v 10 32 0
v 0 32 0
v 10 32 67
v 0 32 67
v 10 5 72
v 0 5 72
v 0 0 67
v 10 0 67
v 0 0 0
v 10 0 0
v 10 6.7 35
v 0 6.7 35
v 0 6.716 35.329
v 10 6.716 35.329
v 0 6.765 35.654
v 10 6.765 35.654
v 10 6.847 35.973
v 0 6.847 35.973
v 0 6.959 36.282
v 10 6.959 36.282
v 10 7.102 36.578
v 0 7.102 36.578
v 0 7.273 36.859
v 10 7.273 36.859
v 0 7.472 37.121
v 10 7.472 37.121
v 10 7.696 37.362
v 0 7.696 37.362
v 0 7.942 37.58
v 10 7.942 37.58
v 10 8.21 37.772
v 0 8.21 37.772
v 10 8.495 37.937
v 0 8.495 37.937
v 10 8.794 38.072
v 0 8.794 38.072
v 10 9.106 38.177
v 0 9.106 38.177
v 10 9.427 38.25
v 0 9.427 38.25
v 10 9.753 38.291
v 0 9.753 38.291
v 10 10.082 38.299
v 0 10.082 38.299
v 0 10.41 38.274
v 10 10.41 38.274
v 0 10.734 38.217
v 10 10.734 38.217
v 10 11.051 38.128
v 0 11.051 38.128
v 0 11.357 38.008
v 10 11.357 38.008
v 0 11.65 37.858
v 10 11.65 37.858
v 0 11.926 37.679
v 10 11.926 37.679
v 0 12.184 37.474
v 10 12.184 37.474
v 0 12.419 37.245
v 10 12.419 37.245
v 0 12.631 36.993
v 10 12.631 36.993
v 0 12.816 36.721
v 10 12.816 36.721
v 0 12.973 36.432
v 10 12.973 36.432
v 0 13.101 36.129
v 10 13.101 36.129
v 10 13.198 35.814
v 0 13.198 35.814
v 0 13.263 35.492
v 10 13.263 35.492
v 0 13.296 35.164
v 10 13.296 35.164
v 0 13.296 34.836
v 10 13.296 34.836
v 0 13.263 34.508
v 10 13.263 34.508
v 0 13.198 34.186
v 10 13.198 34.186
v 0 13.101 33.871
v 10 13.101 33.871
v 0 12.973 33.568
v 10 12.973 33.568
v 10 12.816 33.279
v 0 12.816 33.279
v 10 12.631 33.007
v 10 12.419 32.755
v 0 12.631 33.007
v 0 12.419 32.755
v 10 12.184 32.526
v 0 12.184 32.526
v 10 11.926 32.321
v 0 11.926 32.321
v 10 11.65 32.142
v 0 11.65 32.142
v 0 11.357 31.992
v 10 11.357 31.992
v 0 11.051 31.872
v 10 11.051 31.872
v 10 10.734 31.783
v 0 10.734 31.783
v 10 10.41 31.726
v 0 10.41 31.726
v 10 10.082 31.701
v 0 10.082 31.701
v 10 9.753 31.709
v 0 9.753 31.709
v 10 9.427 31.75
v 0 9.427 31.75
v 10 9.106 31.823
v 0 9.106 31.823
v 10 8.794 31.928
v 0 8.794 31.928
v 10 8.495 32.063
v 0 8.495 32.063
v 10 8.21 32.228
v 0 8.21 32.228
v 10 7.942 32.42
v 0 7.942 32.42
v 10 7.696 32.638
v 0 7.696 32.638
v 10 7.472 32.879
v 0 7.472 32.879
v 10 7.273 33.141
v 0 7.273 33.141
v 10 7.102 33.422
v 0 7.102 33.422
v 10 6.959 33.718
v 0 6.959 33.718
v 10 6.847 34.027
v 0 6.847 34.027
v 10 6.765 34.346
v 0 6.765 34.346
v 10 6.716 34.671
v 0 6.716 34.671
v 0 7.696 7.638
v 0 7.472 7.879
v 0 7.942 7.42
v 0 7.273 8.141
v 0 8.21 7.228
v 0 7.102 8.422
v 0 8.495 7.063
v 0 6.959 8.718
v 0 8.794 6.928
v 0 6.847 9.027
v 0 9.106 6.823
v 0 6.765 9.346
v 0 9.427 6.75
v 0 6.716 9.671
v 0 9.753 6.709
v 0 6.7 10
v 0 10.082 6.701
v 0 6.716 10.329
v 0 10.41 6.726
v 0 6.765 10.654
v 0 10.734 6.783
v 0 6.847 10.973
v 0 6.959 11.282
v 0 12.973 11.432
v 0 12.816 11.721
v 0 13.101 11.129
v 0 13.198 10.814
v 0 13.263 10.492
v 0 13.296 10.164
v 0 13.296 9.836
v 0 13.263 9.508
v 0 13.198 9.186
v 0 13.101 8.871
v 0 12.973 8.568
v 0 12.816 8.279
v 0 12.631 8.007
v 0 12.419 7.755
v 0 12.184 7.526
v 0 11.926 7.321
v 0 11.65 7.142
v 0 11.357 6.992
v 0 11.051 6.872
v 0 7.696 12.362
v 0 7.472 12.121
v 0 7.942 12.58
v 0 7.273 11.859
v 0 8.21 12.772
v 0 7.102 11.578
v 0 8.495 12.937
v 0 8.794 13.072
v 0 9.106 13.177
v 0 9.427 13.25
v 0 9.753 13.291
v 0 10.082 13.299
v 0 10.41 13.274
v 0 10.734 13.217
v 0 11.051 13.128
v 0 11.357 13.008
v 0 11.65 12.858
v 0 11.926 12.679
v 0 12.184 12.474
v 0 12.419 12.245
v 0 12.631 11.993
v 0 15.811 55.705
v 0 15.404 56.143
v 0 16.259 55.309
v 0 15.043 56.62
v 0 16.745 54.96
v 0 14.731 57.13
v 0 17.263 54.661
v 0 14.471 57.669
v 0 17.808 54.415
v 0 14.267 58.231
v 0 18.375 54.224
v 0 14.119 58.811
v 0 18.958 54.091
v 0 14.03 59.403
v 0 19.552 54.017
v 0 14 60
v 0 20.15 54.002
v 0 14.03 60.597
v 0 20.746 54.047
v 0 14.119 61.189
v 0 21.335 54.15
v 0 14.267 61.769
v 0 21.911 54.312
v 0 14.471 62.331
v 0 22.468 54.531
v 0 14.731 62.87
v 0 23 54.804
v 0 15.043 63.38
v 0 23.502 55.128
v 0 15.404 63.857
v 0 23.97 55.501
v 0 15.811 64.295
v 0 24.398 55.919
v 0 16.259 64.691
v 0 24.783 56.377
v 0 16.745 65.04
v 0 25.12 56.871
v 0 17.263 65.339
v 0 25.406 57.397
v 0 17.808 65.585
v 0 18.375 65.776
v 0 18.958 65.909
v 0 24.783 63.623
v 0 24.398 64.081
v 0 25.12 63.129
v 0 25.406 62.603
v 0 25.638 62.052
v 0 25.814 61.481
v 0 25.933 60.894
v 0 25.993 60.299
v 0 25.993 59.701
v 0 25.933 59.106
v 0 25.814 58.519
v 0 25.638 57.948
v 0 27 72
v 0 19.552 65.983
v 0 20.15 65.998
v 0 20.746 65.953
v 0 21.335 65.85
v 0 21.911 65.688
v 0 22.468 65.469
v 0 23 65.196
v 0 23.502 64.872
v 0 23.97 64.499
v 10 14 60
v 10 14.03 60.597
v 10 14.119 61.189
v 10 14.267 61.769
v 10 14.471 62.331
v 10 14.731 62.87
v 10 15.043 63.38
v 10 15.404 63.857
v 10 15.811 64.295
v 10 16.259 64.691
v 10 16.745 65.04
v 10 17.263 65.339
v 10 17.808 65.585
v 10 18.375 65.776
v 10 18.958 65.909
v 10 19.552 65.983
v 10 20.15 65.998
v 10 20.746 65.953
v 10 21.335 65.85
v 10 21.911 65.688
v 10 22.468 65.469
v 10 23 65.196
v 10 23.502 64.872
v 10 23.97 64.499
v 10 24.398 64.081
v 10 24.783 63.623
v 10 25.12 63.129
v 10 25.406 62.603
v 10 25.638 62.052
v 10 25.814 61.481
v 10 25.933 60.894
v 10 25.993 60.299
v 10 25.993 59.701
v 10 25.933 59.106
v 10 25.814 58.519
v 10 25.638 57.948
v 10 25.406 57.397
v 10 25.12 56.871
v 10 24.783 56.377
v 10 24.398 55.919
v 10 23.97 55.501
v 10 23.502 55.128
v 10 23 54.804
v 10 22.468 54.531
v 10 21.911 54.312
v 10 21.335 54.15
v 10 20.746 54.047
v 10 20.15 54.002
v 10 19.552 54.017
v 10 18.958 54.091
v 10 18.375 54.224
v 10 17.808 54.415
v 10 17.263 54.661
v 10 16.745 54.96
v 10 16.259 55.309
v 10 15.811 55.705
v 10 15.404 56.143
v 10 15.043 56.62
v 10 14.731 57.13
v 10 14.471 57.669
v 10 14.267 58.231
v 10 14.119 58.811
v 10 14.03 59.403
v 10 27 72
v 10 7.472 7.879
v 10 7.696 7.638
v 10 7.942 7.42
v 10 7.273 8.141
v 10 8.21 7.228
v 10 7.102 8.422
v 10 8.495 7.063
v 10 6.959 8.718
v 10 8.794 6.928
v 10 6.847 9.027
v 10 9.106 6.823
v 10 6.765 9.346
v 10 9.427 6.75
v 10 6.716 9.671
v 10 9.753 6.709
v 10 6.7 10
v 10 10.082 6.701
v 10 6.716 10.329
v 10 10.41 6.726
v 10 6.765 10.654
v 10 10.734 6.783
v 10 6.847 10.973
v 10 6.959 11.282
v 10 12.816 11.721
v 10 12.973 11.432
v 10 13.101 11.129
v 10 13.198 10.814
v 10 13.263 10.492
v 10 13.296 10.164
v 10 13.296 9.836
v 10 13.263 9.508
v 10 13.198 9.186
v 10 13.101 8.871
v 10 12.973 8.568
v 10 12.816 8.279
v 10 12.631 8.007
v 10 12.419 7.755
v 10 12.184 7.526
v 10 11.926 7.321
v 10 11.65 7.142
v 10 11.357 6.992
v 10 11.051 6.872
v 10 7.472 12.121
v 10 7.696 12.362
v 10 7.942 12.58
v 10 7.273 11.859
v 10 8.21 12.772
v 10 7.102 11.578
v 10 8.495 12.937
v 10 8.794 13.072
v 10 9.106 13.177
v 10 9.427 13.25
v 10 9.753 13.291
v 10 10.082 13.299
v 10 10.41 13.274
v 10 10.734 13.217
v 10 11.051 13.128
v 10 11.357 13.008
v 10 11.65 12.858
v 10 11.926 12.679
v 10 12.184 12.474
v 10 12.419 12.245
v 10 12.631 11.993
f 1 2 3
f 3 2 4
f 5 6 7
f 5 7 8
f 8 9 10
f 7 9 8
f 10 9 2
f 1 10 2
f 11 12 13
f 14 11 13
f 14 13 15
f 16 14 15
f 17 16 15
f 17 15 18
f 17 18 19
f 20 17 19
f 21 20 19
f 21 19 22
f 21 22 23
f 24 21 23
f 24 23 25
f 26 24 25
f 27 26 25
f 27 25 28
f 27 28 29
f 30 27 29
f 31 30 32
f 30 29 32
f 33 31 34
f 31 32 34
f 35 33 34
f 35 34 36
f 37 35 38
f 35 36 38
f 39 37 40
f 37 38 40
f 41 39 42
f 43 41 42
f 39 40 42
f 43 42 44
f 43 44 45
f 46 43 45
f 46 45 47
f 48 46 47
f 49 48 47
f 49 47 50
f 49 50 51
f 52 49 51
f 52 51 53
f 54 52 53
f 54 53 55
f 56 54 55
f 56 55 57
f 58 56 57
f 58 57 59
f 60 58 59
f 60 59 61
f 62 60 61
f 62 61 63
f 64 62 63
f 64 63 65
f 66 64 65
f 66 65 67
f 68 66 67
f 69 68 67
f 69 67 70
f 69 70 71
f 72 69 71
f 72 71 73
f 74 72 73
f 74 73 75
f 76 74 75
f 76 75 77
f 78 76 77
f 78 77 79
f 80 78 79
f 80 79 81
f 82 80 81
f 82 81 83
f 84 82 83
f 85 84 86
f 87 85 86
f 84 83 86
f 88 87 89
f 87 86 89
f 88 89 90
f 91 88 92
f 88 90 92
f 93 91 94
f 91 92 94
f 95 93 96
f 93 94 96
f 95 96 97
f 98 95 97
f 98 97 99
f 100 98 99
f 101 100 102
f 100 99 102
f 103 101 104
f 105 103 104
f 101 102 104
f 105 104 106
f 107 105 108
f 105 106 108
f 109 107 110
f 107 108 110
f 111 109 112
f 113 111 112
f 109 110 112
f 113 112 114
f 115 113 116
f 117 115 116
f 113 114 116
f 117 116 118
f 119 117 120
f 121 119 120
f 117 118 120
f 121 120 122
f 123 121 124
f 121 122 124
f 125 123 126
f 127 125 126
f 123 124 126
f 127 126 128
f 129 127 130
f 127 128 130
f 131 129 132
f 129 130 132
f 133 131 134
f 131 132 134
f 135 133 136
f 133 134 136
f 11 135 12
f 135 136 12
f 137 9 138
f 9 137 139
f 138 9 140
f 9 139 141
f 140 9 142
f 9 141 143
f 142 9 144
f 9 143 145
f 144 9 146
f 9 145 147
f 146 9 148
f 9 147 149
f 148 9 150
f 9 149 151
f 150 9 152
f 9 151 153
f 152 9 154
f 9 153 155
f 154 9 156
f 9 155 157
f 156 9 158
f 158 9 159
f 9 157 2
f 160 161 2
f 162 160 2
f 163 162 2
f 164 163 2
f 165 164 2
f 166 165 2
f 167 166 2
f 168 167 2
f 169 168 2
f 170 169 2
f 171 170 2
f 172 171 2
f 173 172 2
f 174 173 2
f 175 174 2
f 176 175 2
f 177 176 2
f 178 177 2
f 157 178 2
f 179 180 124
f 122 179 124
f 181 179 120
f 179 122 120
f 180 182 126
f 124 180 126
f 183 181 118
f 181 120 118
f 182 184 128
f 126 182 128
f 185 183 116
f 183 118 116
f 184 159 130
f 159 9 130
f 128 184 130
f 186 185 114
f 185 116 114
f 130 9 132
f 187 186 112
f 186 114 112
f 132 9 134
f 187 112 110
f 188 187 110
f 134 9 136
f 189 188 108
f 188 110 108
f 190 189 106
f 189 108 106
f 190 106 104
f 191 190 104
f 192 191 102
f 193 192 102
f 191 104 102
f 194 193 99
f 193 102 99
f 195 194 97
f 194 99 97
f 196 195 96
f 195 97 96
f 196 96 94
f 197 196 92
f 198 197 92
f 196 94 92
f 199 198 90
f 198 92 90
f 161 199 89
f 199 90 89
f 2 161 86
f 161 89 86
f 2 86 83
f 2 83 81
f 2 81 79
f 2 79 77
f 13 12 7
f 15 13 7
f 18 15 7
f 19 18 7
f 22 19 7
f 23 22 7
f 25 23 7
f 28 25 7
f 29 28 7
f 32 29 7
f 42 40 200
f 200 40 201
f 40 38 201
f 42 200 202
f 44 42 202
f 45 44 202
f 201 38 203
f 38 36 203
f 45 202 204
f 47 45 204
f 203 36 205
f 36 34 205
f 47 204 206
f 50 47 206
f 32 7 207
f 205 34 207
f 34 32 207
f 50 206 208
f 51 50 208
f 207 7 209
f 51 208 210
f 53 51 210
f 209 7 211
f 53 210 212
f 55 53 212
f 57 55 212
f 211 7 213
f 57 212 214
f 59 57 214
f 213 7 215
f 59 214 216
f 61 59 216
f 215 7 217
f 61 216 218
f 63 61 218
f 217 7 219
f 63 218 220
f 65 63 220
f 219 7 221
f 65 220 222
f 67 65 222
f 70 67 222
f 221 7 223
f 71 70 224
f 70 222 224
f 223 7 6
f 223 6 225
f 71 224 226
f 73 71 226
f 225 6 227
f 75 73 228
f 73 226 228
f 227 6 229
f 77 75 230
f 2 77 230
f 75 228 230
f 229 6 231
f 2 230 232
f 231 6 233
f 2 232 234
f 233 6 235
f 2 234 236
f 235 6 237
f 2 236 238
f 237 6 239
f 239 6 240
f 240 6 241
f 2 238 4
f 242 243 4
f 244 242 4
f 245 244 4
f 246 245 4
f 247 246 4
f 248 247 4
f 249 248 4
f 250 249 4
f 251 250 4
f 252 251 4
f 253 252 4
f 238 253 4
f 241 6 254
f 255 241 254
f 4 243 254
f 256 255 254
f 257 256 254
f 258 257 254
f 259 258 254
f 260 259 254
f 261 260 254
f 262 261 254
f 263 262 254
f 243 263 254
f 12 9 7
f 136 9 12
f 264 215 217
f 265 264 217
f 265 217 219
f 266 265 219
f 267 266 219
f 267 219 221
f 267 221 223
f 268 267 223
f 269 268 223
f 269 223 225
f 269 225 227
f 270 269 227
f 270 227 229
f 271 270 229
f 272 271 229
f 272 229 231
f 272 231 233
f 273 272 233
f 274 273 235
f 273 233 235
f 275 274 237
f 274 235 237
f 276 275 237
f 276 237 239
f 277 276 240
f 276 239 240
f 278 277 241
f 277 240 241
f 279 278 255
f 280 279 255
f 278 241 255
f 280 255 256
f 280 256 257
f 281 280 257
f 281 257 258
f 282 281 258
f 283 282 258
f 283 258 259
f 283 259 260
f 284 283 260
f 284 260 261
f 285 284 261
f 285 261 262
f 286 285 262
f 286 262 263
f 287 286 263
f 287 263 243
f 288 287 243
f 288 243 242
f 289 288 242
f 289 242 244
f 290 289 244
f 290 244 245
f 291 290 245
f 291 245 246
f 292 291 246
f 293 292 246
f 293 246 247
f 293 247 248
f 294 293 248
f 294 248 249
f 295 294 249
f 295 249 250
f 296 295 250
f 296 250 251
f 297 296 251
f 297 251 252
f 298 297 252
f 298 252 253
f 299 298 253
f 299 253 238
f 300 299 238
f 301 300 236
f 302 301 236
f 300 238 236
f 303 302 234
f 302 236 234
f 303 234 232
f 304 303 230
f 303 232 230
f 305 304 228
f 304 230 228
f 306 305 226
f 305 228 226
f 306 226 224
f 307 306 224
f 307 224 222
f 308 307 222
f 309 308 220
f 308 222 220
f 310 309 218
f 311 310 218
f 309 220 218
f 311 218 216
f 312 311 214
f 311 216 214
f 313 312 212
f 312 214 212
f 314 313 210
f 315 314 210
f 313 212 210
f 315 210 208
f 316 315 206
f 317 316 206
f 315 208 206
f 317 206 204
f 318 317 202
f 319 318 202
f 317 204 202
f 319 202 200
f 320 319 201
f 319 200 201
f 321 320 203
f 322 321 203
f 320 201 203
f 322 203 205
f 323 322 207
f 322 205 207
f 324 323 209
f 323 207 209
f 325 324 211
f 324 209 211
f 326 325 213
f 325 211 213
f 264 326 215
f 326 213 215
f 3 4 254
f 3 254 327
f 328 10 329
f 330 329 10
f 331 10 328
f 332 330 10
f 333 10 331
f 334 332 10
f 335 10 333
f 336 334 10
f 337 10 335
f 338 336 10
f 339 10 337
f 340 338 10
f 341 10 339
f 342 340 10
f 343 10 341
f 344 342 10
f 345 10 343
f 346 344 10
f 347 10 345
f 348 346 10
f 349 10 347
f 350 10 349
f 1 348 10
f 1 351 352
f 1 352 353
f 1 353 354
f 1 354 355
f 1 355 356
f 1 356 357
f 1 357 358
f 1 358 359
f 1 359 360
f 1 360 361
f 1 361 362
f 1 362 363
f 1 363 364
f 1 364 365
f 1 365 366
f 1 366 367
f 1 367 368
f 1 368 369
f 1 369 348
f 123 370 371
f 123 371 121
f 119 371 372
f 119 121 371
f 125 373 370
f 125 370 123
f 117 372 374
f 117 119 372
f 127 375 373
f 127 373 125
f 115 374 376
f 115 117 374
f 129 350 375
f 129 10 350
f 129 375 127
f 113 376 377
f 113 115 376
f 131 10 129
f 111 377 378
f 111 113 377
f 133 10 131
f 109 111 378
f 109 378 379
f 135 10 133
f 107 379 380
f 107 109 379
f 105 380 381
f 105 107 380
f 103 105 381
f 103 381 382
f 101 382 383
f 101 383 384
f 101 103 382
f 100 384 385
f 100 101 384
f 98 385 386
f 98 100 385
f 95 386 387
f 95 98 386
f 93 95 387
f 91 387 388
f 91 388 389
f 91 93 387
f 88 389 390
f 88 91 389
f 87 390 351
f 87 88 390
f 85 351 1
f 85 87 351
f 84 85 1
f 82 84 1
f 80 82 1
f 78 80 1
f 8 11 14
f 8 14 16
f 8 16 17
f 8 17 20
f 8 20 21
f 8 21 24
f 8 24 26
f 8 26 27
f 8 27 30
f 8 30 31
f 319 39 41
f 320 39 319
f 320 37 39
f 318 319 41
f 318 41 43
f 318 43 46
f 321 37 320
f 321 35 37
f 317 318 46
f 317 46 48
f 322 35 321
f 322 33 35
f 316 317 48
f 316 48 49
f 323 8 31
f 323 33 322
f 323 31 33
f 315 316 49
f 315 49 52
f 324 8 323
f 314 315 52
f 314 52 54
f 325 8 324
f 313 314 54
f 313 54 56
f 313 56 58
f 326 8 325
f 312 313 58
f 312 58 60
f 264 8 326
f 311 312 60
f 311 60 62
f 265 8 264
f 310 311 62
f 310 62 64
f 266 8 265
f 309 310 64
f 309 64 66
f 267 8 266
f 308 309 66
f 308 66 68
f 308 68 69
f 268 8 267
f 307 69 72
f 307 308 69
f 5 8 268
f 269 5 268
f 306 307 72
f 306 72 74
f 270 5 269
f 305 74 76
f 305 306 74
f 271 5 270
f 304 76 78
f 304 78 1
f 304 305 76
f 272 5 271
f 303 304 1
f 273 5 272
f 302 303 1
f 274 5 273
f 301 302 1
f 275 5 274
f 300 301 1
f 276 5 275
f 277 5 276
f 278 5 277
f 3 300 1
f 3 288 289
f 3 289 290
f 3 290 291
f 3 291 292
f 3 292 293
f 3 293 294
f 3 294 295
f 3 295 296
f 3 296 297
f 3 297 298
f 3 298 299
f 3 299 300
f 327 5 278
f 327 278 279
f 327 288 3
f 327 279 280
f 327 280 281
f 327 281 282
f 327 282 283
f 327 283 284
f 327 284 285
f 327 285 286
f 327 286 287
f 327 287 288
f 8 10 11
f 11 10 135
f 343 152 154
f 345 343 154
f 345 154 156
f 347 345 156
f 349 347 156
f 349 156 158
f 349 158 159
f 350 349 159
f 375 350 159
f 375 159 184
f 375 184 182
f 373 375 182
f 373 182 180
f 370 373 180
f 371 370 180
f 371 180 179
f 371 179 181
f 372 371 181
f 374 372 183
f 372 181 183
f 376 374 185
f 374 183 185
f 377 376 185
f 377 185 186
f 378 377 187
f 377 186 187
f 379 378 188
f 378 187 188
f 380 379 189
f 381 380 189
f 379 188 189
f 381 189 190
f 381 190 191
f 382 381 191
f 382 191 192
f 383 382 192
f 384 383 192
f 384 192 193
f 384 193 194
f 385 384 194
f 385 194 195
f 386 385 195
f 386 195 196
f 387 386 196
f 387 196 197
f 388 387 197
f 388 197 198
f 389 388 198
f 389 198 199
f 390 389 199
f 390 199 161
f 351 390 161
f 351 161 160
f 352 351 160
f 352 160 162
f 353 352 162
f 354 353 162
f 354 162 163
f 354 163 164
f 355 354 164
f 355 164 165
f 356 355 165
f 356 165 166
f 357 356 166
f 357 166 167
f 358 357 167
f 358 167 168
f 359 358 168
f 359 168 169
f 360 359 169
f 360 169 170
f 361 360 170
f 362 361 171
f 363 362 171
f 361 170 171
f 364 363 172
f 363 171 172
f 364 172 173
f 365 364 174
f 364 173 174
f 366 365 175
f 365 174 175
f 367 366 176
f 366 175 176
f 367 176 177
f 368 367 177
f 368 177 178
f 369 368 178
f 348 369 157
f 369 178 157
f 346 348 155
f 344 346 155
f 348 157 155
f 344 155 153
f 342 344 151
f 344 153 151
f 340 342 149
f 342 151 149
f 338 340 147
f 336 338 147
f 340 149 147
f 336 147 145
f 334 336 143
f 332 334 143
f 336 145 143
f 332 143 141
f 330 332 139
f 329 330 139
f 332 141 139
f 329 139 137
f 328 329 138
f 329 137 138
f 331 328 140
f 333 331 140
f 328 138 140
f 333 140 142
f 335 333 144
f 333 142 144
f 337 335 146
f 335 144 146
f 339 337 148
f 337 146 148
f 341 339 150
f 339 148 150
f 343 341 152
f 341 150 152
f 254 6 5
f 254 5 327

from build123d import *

# Parameters (mm, degrees)
F0_W     = 32
F0_H     = 72
F1_DEPTH = 10
F3_D     = 6.6
F5_D     = 12
F6_SIZE  = 5


with BuildPart() as f1:
    # F0 (on Right) → F1 (new body)
    with BuildSketch(Plane.YZ):
        with Locations((16, 36)):
            Rectangle(F0_W, F0_H)
    extrude(amount=F1_DEPTH)

    # F3 (through all)
    with Locations(Plane.YZ.offset(10)):
        with Locations((10, 35), (10, 10)):
            Hole(F3_D / 2)

    # F5 (through all)
    with Locations(Plane.YZ.offset(10)):
        with Locations((20, 60)):
            Hole(F5_D / 2)

    # F6
    f6_edges = [f1.edges().sort_by_distance(p)[0] for p in [
        (5, 0, 72),
        (5, 32, 72),
    ]]
    chamfer(f6_edges, length=F6_SIZE)


solid = f1.part
